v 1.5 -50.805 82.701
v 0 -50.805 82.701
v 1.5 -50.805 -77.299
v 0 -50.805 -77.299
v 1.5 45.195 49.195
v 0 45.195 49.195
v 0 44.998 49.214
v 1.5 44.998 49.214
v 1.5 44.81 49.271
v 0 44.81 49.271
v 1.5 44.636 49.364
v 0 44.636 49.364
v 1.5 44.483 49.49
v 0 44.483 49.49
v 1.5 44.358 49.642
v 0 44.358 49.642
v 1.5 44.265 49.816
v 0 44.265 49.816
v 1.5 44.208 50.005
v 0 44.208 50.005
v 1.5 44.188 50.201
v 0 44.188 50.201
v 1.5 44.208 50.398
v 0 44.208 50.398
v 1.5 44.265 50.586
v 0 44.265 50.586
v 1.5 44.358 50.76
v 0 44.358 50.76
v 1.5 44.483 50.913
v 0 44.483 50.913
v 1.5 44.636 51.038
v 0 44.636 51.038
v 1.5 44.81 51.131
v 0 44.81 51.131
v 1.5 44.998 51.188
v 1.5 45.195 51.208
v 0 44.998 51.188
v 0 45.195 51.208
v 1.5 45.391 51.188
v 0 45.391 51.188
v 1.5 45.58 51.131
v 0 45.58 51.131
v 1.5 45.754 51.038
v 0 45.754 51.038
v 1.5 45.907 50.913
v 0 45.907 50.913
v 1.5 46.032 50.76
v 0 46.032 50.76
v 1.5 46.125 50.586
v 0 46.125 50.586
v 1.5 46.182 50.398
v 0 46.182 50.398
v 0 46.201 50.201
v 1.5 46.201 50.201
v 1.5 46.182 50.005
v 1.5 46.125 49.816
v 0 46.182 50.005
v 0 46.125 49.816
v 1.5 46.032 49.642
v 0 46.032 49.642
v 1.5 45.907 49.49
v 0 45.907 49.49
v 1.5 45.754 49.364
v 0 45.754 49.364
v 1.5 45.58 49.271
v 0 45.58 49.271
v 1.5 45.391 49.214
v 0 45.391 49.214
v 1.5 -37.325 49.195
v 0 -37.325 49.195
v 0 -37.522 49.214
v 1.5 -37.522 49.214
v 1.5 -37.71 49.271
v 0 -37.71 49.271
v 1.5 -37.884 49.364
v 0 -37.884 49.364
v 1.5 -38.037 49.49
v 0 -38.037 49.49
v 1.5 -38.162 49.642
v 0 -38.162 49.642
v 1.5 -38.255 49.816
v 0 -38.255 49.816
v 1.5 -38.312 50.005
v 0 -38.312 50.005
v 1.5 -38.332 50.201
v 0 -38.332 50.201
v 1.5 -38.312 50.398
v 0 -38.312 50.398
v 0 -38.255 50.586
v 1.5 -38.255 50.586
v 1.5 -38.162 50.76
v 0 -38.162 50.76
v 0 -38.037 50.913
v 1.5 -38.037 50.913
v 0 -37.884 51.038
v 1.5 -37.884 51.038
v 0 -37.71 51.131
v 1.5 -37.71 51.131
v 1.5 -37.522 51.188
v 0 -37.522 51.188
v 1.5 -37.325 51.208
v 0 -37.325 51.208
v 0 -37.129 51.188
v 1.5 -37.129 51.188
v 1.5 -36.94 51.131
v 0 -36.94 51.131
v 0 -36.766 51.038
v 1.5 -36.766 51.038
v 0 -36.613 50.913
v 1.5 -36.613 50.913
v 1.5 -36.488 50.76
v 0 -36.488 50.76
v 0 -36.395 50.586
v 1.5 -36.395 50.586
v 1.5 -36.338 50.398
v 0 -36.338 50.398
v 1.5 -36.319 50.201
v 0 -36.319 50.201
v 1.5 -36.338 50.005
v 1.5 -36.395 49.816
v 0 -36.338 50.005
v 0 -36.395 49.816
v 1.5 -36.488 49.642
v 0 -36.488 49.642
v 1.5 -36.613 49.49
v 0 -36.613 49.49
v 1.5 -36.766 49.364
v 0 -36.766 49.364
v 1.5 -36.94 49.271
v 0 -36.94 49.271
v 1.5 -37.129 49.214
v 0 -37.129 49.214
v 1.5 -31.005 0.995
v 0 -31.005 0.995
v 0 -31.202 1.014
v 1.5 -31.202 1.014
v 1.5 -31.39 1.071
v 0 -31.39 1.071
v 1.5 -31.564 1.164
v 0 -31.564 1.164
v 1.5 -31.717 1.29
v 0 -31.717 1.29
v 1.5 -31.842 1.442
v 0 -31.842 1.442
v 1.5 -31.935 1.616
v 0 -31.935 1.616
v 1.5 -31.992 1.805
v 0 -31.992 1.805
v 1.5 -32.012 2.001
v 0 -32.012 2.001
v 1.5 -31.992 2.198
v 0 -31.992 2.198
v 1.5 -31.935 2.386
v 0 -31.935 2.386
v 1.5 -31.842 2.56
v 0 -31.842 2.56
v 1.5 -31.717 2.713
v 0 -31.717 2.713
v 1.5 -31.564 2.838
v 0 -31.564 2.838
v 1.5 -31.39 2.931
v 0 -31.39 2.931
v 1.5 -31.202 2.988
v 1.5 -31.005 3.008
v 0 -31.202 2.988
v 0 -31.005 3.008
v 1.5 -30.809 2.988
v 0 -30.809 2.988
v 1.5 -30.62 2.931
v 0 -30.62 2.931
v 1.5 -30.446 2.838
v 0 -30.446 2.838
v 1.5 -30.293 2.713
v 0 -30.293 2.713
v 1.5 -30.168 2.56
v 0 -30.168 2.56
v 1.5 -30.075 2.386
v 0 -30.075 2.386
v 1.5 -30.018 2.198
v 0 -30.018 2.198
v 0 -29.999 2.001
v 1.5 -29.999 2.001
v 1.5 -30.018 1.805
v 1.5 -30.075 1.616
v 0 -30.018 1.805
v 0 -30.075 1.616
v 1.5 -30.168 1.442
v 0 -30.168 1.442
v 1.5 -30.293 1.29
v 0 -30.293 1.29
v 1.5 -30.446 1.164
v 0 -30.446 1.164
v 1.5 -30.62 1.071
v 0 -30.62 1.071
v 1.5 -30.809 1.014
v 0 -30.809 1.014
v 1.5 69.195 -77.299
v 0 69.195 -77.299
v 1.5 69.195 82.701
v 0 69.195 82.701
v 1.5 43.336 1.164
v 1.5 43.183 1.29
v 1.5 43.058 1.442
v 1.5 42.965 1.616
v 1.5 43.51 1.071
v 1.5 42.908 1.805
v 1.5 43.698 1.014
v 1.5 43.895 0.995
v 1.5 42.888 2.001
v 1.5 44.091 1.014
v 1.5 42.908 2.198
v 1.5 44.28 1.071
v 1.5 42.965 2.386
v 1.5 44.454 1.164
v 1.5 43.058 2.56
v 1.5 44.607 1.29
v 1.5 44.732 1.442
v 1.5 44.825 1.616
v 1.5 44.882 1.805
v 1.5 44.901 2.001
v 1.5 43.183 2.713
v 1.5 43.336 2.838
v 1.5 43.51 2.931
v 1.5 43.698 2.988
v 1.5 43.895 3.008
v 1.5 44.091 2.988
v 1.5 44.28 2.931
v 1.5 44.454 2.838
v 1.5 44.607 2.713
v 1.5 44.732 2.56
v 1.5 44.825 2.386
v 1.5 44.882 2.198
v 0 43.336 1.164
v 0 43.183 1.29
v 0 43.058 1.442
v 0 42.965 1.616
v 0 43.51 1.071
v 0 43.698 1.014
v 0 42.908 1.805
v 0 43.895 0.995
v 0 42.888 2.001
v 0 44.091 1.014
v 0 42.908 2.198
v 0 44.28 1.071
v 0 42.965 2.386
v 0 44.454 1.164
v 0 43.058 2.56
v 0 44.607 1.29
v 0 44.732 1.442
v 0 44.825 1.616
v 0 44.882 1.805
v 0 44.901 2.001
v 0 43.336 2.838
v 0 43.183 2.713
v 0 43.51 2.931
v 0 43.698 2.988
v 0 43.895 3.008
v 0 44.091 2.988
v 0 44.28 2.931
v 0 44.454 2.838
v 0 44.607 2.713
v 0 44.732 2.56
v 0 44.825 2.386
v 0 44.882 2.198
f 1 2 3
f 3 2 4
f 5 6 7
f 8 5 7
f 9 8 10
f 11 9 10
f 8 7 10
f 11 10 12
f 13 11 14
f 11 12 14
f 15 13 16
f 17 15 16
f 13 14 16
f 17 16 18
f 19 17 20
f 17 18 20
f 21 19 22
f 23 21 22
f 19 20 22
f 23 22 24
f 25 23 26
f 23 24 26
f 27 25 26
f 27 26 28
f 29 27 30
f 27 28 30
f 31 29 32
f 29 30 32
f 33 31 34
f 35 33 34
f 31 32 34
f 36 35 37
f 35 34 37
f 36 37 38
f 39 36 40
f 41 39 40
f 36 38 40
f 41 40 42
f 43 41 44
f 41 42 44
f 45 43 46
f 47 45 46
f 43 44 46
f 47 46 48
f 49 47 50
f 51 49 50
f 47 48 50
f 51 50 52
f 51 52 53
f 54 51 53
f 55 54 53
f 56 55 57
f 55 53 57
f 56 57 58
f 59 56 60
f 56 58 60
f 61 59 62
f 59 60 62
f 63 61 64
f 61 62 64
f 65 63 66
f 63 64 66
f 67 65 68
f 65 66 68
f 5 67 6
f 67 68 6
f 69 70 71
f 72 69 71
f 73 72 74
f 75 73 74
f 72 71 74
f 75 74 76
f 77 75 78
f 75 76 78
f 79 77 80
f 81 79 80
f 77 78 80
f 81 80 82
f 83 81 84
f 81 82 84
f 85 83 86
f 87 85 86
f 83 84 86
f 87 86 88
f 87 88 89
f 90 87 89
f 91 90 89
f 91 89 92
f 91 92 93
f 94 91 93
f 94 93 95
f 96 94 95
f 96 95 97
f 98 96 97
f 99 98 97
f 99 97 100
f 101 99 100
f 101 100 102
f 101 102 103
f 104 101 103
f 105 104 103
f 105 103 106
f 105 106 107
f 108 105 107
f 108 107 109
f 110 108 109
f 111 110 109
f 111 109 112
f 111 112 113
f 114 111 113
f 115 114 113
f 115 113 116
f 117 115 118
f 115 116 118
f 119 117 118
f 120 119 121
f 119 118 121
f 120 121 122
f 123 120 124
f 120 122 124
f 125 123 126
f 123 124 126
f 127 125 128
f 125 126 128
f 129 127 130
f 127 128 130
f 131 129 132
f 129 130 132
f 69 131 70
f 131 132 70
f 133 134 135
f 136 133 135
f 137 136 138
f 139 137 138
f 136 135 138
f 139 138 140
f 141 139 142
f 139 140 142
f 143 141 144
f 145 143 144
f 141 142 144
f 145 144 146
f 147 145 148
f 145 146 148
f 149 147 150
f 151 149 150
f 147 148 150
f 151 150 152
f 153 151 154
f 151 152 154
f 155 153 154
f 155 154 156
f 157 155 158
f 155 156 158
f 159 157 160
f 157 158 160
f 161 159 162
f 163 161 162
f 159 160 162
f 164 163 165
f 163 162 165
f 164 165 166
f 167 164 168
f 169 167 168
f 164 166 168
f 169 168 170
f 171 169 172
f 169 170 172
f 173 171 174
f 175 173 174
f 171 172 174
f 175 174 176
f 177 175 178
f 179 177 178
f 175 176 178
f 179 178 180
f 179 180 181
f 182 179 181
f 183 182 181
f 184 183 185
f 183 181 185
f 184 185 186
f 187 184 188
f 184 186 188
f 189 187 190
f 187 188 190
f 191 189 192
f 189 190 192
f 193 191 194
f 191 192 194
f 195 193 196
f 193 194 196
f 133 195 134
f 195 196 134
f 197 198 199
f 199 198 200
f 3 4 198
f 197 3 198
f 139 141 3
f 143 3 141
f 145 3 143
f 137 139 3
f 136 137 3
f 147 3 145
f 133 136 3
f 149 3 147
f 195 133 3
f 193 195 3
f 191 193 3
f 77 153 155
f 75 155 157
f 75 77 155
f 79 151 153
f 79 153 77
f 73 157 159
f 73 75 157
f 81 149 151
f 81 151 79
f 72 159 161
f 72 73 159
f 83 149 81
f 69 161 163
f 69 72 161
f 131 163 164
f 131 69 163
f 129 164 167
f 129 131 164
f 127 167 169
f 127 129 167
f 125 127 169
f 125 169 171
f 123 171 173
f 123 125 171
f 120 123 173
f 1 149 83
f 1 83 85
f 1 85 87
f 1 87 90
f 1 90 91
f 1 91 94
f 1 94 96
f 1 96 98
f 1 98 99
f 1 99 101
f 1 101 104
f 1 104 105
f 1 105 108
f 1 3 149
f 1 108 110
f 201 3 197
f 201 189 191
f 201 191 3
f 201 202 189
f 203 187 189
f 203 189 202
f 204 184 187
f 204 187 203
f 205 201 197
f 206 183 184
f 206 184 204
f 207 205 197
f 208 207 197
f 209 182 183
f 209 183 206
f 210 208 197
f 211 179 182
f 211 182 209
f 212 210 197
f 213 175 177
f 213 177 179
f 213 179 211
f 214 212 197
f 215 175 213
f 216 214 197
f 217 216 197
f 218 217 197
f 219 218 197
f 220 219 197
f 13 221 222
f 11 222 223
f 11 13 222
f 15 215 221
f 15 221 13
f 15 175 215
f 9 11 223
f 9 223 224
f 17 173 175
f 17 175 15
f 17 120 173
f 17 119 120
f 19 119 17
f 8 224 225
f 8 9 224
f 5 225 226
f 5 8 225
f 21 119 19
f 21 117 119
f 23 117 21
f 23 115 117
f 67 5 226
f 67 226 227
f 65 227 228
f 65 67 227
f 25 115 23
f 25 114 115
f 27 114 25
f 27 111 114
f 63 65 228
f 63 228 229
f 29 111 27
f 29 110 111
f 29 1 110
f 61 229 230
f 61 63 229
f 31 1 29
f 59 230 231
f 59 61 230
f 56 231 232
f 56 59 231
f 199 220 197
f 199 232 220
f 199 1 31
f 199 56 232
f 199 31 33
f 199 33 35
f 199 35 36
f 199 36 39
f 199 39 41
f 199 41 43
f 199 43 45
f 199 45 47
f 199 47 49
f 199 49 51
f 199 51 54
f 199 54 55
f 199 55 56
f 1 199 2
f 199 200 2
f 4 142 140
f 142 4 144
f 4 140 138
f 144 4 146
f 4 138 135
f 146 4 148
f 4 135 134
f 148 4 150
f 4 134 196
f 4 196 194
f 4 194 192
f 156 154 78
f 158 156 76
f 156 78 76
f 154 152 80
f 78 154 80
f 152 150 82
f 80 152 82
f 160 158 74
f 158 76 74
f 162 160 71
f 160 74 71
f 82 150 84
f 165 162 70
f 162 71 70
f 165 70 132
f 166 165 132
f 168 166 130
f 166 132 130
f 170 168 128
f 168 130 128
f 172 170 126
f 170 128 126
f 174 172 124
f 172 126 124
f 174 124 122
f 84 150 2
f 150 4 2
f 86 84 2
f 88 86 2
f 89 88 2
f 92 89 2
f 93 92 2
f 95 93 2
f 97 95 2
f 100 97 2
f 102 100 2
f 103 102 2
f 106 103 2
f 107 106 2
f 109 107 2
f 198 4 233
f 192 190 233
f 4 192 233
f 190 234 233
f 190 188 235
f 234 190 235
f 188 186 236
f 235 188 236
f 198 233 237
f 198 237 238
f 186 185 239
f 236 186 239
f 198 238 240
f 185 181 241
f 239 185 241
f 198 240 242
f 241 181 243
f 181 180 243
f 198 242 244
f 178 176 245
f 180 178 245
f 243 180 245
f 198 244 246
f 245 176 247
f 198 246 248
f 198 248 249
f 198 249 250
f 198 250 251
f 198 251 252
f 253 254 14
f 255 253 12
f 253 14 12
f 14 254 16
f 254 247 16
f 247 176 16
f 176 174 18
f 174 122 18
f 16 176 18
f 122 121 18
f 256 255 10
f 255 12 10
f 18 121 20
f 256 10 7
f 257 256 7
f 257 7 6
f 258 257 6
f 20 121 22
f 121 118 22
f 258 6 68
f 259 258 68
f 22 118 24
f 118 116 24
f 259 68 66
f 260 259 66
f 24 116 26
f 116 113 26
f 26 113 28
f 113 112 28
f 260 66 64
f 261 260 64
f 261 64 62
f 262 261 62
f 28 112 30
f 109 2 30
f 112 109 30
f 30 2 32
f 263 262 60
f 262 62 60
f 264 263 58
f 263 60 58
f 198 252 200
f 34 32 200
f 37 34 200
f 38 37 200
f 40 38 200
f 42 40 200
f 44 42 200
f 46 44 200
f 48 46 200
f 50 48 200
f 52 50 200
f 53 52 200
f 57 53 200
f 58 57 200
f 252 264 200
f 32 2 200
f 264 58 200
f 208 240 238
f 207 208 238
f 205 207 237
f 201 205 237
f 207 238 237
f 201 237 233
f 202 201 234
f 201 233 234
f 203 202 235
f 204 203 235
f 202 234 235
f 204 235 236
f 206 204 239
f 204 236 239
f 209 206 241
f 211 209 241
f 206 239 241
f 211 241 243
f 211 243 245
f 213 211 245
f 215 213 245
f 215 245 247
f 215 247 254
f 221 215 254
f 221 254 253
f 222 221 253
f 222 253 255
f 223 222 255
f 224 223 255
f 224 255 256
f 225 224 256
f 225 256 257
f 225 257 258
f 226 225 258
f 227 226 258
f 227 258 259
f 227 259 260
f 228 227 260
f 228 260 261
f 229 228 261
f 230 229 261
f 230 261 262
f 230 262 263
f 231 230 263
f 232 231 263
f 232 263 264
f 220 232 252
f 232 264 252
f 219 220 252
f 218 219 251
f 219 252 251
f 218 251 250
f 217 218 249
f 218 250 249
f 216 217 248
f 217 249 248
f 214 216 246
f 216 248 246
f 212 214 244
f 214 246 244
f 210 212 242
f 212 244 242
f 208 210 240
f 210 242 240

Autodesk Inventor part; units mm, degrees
ref_plane "YZ Plane" through (0, 0, 0) normal (1, 0, 0) x (0, 1, 0)
ref_plane "XZ Plane" through (0, 0, 0) normal (0, 1, 0) x (-1, 0, 0)
ref_plane "XY Plane" through (0, 0, 0) normal (0, 0, 1) x (1, 0, 0)
sketch "Sketch1" plane through (0, 0, 0) normal (1, 0, 0) x (0, 1, 0)
  line L0 (69.1948, 82.7013) -> (-50.8052, 82.7013)
  line L1 (-50.8052, 82.7013) -> (-50.8052, -77.2987)
  line L2 (-50.8052, -77.2987) -> (69.1948, -77.2987)
  line L3 (69.1948, -77.2987) -> (69.1948, 82.7013)
  point P0 (0, 0)
  dimension "d0" = 160
  dimension "d1" = 120
extrude "Extrusion1" add sketch "Sketch1" along normal blind 1.5
sketch "Sketch2" plane through (1.5, 0, 0) normal (1, 0, 0) x (0, 0, -1)
  line L0 (-52.7013, 59.1948) -> (0.5987, 59.1948)
  line L1 (-52.7013, 59.1948) -> (-52.7013, -42.4052)
  line L2 (77.2987, 69.1948) -> (-82.7013, 69.1948) projected
  line L3 (-82.7013, 69.1948) -> (-82.7013, -50.8052) projected
  line L4 (0.5987, 59.1948) -> (0.5987, -42.4052)
  line L5 (0.5987, -42.4052) -> (-52.7013, -42.4052)
  point P0 (0, 0)
  point P1 (-50.2013, 45.1948)
  point P2 (-50.2013, -37.3252)
  point P3 (-2.0013, 43.8948)
  point P4 (-2.0013, -31.0052)
  dimension "d4" = 14
  dimension "d5" = 15.3
  dimension "d6" = 101.6
  dimension "d7" = 2.5
  dimension "d8" = 10
  dimension "d9" = 30
  dimension "d10" = 53.3
  dimension "d12" = 2.5
  dimension "d13" = 50.7
  dimension "d14" = 50.7
  dimension "d15" = 90.2
  dimension "d16" = 96.52
hole "Hole1" at (1.5, 45.1948, 50.2013) at (1.5, -37.3252, 50.2013) at (1.5, 43.8948, 2.0013) at (1.5, -31.0052, 2.0013) direction (-1, 0, 0) diameter 2.013 end through all thread size "M2.5x0.45" class "6H" standard "ANSI Metric M Profile"
equation "\"d14\" = d13"
properties part number "mount"
